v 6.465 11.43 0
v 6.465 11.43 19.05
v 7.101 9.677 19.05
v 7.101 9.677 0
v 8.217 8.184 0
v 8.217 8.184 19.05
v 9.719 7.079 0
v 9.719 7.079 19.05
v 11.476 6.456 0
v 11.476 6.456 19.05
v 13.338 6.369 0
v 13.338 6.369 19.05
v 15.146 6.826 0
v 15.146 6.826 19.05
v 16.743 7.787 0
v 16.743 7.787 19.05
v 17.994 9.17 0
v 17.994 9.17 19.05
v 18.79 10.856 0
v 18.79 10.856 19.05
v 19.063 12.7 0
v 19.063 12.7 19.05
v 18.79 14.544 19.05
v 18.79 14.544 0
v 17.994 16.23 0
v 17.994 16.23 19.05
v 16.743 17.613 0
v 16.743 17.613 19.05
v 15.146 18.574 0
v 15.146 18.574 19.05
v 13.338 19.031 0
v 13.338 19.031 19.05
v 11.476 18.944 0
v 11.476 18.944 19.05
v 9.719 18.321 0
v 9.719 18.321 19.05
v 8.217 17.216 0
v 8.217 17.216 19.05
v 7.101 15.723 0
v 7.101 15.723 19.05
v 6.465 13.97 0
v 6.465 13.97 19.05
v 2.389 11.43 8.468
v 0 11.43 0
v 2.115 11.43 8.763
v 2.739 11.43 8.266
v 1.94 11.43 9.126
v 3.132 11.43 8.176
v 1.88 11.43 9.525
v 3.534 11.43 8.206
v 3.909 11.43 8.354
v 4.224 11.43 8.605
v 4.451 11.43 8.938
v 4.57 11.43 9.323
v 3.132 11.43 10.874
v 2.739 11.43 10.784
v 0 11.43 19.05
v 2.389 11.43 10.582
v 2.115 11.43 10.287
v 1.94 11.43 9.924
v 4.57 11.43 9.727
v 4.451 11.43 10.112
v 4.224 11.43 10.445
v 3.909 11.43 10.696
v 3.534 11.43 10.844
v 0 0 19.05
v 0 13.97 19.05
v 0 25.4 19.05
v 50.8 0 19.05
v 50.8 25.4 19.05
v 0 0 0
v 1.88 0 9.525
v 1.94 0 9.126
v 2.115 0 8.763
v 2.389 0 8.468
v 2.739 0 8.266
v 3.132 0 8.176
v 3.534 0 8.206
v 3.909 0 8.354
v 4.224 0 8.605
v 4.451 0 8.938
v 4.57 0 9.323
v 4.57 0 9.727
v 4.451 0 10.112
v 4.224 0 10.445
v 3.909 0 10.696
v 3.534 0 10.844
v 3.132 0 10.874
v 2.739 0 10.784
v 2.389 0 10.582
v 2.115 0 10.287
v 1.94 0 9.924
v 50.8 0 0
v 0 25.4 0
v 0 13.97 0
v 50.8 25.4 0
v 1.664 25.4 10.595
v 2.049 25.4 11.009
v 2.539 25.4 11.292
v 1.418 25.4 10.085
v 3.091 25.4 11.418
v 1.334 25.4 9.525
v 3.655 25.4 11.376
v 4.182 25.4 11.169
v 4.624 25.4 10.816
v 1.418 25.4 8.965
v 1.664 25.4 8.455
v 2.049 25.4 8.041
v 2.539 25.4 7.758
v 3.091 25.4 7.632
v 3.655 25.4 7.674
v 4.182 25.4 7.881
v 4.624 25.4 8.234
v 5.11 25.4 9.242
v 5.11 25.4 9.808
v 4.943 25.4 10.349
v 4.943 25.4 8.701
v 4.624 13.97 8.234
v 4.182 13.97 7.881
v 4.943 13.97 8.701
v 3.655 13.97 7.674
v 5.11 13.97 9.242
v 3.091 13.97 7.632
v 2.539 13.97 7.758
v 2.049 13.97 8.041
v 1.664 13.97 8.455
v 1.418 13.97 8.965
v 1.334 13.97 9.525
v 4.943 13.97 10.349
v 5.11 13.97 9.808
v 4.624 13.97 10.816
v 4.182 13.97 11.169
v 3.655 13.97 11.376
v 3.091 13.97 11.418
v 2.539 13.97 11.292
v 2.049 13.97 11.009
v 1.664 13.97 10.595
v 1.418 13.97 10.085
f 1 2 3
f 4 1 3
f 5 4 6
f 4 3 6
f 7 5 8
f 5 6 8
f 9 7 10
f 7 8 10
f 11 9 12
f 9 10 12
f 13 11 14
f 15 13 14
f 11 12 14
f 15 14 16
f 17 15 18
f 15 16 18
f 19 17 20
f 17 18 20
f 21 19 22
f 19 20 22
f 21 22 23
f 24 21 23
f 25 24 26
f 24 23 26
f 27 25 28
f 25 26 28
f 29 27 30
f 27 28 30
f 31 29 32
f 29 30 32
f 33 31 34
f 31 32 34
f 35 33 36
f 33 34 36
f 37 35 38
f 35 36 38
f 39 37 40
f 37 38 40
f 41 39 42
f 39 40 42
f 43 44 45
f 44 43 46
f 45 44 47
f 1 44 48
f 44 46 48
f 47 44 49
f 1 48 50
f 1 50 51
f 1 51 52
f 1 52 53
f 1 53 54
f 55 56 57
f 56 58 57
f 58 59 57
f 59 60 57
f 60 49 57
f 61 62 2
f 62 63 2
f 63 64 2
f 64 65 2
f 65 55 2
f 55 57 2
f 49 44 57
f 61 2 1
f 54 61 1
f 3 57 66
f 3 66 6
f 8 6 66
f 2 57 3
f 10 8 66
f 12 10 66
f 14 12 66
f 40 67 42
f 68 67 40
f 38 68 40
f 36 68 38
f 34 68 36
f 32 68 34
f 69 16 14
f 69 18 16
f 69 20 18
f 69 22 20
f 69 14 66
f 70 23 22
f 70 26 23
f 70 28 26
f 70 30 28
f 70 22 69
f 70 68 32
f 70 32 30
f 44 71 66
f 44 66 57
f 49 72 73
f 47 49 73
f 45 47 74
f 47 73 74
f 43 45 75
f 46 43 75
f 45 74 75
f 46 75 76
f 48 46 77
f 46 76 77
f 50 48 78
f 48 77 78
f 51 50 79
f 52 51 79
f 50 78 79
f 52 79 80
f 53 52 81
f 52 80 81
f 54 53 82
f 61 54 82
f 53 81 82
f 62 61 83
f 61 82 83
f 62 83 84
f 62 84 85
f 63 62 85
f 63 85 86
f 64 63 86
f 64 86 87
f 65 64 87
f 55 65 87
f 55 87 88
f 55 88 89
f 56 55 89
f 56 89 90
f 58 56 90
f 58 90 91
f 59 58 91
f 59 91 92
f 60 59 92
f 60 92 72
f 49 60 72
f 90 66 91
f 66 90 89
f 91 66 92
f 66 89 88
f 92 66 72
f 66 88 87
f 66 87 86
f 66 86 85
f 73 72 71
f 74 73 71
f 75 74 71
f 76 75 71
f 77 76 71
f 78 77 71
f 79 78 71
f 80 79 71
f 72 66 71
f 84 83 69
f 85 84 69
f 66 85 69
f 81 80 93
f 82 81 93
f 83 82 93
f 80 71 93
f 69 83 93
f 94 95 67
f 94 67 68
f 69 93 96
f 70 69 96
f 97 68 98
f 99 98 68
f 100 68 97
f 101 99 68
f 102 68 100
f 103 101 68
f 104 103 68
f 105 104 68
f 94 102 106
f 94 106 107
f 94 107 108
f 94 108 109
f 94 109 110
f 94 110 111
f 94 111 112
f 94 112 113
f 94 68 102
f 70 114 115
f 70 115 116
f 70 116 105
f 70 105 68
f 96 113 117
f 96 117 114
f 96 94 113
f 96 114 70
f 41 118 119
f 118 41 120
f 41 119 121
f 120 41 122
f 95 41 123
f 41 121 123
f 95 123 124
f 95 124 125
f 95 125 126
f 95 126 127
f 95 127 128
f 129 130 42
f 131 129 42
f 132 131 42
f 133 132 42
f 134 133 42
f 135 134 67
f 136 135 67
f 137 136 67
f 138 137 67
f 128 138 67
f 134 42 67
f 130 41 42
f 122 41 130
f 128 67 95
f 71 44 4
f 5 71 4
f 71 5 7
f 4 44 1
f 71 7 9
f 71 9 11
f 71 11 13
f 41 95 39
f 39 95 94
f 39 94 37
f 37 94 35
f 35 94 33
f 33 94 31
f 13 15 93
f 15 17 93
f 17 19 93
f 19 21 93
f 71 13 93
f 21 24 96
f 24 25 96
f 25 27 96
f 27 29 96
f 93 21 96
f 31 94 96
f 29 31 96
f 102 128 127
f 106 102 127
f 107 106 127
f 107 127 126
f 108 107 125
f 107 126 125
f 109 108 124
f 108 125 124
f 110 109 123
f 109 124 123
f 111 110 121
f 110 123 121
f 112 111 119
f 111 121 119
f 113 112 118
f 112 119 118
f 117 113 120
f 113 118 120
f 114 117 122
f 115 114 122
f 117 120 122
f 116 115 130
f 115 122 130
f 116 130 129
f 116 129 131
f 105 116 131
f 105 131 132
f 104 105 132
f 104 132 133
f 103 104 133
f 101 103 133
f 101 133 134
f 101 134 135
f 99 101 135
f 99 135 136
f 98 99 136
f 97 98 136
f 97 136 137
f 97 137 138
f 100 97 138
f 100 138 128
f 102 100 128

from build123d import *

# Parameters (mm, degrees)
SKETCH1_W                 = 50.8
SKETCH1_H                 = 25.4
BOSS_EXTRUDE1_DEPTH       = 19.05
CUT_EXTRUDE1_DEPTH        = 19.05
F_6_CLEARANCE_HOLE1_D     = 3.7973
F_6_CLEARANCE_HOLE1_DEPTH = 11.43
F_6_32_TAPPED_HOLE1_D     = 2.7051


with BuildPart() as part:
    # Sketch1 → Boss-Extrude1 (new body)
    with BuildSketch(Plane.XY):
        with Locations((25.4, 12.7)):
            Rectangle(SKETCH1_W, SKETCH1_H)
    extrude(amount=BOSS_EXTRUDE1_DEPTH)

    # Sketch2 → Cut-Extrude1 (cut)
    with BuildSketch(Plane.XY.offset(19.05)):
        with BuildLine():
            Line((12.7, 13.97), (12.7, 11.43))
            Line((12.7, 11.43), (6.465334709, 11.43))
            ThreePointArc((6.465334709, 11.43), (13.338218788, 6.369389597), (19.0627, 12.7))
            ThreePointArc((19.0627, 12.7), (13.338218788, 19.030610403), (6.465334709, 13.97))
            Line((6.465334709, 13.97), (12.7, 13.97))
        make_face()
        with BuildLine():
            Line((6.465334709, 11.43), (12.7, 11.43))
            Line((12.7, 11.43), (12.7, 13.97))
            Line((12.7, 13.97), (6.465334709, 13.97))
            ThreePointArc((6.465334709, 13.97), (6.3373, 12.7), (6.465334709, 11.43))
        make_face()
        with BuildLine():
            Line((0, 11.43), (6.465334709, 11.43))
            ThreePointArc((6.465334709, 11.43), (6.3373, 12.7), (6.465334709, 13.97))
            Line((6.465334709, 13.97), (0, 13.97))
            Line((0, 13.97), (0, 11.43))
        make_face()
    extrude(amount=-CUT_EXTRUDE1_DEPTH, mode=Mode.SUBTRACT)

    # #6 Clearance Hole1
    with Locations(Plane(origin=(0, 25.4, 0), x_dir=(1, 0, 0), z_dir=(0, 1, 0))):
        with Locations((3.232667355, -9.525)):
            Hole(F_6_CLEARANCE_HOLE1_D / 2, depth=F_6_CLEARANCE_HOLE1_DEPTH)

    # #6-32 Tapped Hole1 (through all)
    with Locations(Plane(origin=(0, 11.43, 0), x_dir=(1, 0, 0), z_dir=(0, 1, 0))):
        with Locations((3.232667355, -9.525)):
            Hole(F_6_32_TAPPED_HOLE1_D / 2)


solid = part.part
